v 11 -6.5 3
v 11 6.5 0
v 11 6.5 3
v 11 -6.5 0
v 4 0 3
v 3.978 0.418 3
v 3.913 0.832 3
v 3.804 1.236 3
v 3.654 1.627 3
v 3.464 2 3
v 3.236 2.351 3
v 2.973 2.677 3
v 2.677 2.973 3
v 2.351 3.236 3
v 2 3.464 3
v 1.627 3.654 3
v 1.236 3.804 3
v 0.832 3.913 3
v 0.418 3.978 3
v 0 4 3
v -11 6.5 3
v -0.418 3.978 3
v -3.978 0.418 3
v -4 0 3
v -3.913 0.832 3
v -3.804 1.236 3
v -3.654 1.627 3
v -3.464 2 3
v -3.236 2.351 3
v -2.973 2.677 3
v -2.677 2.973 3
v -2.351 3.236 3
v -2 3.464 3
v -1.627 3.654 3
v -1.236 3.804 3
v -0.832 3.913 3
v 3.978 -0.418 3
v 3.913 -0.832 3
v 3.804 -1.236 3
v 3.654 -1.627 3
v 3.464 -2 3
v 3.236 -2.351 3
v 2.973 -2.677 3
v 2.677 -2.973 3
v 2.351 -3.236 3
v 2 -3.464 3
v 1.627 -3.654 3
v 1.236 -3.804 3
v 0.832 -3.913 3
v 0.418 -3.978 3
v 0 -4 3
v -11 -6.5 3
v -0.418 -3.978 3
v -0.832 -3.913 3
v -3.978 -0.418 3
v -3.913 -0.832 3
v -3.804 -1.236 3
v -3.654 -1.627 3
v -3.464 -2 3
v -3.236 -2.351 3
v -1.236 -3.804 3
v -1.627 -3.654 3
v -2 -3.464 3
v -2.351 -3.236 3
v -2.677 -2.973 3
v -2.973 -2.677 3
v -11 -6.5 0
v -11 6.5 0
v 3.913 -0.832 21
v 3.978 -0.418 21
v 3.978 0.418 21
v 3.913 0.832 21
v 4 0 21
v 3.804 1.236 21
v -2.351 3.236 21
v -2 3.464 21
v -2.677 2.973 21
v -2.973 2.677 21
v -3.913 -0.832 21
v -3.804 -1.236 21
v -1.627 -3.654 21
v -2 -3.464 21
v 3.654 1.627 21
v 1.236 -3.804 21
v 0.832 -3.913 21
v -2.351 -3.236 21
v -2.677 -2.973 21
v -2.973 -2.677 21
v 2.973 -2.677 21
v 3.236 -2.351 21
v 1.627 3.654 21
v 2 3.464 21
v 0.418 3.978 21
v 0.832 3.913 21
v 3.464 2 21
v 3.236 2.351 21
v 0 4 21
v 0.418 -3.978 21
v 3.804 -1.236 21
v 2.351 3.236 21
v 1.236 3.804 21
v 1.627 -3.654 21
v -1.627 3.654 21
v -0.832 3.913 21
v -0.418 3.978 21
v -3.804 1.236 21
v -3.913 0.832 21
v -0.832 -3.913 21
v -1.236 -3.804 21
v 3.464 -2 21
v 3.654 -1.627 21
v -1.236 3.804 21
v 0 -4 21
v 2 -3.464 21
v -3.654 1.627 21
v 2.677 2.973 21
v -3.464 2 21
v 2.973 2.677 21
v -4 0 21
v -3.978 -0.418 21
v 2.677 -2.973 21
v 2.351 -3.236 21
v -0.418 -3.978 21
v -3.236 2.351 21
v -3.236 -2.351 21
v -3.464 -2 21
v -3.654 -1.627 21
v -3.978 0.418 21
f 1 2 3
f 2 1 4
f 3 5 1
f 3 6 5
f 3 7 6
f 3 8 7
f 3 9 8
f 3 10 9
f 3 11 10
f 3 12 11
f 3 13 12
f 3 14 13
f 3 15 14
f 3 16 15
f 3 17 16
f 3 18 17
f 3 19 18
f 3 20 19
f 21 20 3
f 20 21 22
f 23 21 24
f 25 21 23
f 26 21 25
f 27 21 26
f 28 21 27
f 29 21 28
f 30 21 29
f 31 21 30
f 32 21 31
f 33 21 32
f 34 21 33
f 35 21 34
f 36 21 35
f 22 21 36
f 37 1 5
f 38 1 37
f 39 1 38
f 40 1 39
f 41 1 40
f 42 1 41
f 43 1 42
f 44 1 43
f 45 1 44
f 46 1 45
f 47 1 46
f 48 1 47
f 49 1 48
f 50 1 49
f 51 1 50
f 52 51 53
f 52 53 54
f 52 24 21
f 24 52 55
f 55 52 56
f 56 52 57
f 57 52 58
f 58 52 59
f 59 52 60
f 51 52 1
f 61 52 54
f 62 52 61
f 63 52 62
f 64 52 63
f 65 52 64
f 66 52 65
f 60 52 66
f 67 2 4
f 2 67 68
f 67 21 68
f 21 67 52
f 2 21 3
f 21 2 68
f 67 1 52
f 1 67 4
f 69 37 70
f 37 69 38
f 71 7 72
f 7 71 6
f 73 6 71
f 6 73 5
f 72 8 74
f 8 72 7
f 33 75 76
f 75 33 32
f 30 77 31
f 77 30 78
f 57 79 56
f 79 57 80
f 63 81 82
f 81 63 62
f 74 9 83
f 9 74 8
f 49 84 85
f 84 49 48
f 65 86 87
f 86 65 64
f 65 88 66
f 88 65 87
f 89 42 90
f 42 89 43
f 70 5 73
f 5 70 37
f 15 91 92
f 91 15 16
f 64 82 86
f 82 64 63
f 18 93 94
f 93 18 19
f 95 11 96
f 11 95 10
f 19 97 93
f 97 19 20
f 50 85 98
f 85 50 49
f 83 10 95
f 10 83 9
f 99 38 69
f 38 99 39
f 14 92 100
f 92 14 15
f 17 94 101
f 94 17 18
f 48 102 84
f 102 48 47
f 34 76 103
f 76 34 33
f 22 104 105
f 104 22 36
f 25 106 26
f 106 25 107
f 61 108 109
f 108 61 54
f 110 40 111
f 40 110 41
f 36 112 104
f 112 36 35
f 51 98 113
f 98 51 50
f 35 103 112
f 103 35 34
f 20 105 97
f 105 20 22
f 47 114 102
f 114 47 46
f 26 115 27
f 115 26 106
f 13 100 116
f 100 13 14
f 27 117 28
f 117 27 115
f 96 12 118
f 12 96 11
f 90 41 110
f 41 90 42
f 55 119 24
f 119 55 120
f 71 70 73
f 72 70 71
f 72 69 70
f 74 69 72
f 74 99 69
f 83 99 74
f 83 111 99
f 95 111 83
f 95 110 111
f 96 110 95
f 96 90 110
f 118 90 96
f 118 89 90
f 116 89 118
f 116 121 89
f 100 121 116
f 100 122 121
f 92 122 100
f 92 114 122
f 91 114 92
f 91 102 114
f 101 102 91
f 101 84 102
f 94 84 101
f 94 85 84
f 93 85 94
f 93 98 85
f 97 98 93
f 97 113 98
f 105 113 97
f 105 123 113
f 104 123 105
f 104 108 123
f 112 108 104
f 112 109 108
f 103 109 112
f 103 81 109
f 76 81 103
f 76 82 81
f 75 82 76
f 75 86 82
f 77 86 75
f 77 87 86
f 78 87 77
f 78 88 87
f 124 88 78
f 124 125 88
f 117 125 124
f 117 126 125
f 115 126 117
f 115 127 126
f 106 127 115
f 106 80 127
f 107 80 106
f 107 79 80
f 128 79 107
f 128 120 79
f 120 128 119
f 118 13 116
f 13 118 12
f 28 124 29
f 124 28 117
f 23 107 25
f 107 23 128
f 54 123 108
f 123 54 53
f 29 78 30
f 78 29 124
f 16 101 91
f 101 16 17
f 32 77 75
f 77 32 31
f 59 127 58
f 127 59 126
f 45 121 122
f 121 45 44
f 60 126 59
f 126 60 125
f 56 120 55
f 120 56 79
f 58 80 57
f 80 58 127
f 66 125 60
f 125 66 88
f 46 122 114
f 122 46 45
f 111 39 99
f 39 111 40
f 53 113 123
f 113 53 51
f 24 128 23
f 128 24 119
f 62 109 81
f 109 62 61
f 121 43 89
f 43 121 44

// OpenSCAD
// T-head slot bolt.
$fn = 60;
eps = 0.02;
shaft_d = 8;
head_l = 22;
shaft_l = 18;
head_w = shaft_d + 5;
head_h = 3;
union() {
    translate([-head_l/2,-head_w/2,0]) cube([head_l,head_w,head_h]);
    translate([0,0,head_h]) cylinder(d=shaft_d,h=shaft_l);
}
